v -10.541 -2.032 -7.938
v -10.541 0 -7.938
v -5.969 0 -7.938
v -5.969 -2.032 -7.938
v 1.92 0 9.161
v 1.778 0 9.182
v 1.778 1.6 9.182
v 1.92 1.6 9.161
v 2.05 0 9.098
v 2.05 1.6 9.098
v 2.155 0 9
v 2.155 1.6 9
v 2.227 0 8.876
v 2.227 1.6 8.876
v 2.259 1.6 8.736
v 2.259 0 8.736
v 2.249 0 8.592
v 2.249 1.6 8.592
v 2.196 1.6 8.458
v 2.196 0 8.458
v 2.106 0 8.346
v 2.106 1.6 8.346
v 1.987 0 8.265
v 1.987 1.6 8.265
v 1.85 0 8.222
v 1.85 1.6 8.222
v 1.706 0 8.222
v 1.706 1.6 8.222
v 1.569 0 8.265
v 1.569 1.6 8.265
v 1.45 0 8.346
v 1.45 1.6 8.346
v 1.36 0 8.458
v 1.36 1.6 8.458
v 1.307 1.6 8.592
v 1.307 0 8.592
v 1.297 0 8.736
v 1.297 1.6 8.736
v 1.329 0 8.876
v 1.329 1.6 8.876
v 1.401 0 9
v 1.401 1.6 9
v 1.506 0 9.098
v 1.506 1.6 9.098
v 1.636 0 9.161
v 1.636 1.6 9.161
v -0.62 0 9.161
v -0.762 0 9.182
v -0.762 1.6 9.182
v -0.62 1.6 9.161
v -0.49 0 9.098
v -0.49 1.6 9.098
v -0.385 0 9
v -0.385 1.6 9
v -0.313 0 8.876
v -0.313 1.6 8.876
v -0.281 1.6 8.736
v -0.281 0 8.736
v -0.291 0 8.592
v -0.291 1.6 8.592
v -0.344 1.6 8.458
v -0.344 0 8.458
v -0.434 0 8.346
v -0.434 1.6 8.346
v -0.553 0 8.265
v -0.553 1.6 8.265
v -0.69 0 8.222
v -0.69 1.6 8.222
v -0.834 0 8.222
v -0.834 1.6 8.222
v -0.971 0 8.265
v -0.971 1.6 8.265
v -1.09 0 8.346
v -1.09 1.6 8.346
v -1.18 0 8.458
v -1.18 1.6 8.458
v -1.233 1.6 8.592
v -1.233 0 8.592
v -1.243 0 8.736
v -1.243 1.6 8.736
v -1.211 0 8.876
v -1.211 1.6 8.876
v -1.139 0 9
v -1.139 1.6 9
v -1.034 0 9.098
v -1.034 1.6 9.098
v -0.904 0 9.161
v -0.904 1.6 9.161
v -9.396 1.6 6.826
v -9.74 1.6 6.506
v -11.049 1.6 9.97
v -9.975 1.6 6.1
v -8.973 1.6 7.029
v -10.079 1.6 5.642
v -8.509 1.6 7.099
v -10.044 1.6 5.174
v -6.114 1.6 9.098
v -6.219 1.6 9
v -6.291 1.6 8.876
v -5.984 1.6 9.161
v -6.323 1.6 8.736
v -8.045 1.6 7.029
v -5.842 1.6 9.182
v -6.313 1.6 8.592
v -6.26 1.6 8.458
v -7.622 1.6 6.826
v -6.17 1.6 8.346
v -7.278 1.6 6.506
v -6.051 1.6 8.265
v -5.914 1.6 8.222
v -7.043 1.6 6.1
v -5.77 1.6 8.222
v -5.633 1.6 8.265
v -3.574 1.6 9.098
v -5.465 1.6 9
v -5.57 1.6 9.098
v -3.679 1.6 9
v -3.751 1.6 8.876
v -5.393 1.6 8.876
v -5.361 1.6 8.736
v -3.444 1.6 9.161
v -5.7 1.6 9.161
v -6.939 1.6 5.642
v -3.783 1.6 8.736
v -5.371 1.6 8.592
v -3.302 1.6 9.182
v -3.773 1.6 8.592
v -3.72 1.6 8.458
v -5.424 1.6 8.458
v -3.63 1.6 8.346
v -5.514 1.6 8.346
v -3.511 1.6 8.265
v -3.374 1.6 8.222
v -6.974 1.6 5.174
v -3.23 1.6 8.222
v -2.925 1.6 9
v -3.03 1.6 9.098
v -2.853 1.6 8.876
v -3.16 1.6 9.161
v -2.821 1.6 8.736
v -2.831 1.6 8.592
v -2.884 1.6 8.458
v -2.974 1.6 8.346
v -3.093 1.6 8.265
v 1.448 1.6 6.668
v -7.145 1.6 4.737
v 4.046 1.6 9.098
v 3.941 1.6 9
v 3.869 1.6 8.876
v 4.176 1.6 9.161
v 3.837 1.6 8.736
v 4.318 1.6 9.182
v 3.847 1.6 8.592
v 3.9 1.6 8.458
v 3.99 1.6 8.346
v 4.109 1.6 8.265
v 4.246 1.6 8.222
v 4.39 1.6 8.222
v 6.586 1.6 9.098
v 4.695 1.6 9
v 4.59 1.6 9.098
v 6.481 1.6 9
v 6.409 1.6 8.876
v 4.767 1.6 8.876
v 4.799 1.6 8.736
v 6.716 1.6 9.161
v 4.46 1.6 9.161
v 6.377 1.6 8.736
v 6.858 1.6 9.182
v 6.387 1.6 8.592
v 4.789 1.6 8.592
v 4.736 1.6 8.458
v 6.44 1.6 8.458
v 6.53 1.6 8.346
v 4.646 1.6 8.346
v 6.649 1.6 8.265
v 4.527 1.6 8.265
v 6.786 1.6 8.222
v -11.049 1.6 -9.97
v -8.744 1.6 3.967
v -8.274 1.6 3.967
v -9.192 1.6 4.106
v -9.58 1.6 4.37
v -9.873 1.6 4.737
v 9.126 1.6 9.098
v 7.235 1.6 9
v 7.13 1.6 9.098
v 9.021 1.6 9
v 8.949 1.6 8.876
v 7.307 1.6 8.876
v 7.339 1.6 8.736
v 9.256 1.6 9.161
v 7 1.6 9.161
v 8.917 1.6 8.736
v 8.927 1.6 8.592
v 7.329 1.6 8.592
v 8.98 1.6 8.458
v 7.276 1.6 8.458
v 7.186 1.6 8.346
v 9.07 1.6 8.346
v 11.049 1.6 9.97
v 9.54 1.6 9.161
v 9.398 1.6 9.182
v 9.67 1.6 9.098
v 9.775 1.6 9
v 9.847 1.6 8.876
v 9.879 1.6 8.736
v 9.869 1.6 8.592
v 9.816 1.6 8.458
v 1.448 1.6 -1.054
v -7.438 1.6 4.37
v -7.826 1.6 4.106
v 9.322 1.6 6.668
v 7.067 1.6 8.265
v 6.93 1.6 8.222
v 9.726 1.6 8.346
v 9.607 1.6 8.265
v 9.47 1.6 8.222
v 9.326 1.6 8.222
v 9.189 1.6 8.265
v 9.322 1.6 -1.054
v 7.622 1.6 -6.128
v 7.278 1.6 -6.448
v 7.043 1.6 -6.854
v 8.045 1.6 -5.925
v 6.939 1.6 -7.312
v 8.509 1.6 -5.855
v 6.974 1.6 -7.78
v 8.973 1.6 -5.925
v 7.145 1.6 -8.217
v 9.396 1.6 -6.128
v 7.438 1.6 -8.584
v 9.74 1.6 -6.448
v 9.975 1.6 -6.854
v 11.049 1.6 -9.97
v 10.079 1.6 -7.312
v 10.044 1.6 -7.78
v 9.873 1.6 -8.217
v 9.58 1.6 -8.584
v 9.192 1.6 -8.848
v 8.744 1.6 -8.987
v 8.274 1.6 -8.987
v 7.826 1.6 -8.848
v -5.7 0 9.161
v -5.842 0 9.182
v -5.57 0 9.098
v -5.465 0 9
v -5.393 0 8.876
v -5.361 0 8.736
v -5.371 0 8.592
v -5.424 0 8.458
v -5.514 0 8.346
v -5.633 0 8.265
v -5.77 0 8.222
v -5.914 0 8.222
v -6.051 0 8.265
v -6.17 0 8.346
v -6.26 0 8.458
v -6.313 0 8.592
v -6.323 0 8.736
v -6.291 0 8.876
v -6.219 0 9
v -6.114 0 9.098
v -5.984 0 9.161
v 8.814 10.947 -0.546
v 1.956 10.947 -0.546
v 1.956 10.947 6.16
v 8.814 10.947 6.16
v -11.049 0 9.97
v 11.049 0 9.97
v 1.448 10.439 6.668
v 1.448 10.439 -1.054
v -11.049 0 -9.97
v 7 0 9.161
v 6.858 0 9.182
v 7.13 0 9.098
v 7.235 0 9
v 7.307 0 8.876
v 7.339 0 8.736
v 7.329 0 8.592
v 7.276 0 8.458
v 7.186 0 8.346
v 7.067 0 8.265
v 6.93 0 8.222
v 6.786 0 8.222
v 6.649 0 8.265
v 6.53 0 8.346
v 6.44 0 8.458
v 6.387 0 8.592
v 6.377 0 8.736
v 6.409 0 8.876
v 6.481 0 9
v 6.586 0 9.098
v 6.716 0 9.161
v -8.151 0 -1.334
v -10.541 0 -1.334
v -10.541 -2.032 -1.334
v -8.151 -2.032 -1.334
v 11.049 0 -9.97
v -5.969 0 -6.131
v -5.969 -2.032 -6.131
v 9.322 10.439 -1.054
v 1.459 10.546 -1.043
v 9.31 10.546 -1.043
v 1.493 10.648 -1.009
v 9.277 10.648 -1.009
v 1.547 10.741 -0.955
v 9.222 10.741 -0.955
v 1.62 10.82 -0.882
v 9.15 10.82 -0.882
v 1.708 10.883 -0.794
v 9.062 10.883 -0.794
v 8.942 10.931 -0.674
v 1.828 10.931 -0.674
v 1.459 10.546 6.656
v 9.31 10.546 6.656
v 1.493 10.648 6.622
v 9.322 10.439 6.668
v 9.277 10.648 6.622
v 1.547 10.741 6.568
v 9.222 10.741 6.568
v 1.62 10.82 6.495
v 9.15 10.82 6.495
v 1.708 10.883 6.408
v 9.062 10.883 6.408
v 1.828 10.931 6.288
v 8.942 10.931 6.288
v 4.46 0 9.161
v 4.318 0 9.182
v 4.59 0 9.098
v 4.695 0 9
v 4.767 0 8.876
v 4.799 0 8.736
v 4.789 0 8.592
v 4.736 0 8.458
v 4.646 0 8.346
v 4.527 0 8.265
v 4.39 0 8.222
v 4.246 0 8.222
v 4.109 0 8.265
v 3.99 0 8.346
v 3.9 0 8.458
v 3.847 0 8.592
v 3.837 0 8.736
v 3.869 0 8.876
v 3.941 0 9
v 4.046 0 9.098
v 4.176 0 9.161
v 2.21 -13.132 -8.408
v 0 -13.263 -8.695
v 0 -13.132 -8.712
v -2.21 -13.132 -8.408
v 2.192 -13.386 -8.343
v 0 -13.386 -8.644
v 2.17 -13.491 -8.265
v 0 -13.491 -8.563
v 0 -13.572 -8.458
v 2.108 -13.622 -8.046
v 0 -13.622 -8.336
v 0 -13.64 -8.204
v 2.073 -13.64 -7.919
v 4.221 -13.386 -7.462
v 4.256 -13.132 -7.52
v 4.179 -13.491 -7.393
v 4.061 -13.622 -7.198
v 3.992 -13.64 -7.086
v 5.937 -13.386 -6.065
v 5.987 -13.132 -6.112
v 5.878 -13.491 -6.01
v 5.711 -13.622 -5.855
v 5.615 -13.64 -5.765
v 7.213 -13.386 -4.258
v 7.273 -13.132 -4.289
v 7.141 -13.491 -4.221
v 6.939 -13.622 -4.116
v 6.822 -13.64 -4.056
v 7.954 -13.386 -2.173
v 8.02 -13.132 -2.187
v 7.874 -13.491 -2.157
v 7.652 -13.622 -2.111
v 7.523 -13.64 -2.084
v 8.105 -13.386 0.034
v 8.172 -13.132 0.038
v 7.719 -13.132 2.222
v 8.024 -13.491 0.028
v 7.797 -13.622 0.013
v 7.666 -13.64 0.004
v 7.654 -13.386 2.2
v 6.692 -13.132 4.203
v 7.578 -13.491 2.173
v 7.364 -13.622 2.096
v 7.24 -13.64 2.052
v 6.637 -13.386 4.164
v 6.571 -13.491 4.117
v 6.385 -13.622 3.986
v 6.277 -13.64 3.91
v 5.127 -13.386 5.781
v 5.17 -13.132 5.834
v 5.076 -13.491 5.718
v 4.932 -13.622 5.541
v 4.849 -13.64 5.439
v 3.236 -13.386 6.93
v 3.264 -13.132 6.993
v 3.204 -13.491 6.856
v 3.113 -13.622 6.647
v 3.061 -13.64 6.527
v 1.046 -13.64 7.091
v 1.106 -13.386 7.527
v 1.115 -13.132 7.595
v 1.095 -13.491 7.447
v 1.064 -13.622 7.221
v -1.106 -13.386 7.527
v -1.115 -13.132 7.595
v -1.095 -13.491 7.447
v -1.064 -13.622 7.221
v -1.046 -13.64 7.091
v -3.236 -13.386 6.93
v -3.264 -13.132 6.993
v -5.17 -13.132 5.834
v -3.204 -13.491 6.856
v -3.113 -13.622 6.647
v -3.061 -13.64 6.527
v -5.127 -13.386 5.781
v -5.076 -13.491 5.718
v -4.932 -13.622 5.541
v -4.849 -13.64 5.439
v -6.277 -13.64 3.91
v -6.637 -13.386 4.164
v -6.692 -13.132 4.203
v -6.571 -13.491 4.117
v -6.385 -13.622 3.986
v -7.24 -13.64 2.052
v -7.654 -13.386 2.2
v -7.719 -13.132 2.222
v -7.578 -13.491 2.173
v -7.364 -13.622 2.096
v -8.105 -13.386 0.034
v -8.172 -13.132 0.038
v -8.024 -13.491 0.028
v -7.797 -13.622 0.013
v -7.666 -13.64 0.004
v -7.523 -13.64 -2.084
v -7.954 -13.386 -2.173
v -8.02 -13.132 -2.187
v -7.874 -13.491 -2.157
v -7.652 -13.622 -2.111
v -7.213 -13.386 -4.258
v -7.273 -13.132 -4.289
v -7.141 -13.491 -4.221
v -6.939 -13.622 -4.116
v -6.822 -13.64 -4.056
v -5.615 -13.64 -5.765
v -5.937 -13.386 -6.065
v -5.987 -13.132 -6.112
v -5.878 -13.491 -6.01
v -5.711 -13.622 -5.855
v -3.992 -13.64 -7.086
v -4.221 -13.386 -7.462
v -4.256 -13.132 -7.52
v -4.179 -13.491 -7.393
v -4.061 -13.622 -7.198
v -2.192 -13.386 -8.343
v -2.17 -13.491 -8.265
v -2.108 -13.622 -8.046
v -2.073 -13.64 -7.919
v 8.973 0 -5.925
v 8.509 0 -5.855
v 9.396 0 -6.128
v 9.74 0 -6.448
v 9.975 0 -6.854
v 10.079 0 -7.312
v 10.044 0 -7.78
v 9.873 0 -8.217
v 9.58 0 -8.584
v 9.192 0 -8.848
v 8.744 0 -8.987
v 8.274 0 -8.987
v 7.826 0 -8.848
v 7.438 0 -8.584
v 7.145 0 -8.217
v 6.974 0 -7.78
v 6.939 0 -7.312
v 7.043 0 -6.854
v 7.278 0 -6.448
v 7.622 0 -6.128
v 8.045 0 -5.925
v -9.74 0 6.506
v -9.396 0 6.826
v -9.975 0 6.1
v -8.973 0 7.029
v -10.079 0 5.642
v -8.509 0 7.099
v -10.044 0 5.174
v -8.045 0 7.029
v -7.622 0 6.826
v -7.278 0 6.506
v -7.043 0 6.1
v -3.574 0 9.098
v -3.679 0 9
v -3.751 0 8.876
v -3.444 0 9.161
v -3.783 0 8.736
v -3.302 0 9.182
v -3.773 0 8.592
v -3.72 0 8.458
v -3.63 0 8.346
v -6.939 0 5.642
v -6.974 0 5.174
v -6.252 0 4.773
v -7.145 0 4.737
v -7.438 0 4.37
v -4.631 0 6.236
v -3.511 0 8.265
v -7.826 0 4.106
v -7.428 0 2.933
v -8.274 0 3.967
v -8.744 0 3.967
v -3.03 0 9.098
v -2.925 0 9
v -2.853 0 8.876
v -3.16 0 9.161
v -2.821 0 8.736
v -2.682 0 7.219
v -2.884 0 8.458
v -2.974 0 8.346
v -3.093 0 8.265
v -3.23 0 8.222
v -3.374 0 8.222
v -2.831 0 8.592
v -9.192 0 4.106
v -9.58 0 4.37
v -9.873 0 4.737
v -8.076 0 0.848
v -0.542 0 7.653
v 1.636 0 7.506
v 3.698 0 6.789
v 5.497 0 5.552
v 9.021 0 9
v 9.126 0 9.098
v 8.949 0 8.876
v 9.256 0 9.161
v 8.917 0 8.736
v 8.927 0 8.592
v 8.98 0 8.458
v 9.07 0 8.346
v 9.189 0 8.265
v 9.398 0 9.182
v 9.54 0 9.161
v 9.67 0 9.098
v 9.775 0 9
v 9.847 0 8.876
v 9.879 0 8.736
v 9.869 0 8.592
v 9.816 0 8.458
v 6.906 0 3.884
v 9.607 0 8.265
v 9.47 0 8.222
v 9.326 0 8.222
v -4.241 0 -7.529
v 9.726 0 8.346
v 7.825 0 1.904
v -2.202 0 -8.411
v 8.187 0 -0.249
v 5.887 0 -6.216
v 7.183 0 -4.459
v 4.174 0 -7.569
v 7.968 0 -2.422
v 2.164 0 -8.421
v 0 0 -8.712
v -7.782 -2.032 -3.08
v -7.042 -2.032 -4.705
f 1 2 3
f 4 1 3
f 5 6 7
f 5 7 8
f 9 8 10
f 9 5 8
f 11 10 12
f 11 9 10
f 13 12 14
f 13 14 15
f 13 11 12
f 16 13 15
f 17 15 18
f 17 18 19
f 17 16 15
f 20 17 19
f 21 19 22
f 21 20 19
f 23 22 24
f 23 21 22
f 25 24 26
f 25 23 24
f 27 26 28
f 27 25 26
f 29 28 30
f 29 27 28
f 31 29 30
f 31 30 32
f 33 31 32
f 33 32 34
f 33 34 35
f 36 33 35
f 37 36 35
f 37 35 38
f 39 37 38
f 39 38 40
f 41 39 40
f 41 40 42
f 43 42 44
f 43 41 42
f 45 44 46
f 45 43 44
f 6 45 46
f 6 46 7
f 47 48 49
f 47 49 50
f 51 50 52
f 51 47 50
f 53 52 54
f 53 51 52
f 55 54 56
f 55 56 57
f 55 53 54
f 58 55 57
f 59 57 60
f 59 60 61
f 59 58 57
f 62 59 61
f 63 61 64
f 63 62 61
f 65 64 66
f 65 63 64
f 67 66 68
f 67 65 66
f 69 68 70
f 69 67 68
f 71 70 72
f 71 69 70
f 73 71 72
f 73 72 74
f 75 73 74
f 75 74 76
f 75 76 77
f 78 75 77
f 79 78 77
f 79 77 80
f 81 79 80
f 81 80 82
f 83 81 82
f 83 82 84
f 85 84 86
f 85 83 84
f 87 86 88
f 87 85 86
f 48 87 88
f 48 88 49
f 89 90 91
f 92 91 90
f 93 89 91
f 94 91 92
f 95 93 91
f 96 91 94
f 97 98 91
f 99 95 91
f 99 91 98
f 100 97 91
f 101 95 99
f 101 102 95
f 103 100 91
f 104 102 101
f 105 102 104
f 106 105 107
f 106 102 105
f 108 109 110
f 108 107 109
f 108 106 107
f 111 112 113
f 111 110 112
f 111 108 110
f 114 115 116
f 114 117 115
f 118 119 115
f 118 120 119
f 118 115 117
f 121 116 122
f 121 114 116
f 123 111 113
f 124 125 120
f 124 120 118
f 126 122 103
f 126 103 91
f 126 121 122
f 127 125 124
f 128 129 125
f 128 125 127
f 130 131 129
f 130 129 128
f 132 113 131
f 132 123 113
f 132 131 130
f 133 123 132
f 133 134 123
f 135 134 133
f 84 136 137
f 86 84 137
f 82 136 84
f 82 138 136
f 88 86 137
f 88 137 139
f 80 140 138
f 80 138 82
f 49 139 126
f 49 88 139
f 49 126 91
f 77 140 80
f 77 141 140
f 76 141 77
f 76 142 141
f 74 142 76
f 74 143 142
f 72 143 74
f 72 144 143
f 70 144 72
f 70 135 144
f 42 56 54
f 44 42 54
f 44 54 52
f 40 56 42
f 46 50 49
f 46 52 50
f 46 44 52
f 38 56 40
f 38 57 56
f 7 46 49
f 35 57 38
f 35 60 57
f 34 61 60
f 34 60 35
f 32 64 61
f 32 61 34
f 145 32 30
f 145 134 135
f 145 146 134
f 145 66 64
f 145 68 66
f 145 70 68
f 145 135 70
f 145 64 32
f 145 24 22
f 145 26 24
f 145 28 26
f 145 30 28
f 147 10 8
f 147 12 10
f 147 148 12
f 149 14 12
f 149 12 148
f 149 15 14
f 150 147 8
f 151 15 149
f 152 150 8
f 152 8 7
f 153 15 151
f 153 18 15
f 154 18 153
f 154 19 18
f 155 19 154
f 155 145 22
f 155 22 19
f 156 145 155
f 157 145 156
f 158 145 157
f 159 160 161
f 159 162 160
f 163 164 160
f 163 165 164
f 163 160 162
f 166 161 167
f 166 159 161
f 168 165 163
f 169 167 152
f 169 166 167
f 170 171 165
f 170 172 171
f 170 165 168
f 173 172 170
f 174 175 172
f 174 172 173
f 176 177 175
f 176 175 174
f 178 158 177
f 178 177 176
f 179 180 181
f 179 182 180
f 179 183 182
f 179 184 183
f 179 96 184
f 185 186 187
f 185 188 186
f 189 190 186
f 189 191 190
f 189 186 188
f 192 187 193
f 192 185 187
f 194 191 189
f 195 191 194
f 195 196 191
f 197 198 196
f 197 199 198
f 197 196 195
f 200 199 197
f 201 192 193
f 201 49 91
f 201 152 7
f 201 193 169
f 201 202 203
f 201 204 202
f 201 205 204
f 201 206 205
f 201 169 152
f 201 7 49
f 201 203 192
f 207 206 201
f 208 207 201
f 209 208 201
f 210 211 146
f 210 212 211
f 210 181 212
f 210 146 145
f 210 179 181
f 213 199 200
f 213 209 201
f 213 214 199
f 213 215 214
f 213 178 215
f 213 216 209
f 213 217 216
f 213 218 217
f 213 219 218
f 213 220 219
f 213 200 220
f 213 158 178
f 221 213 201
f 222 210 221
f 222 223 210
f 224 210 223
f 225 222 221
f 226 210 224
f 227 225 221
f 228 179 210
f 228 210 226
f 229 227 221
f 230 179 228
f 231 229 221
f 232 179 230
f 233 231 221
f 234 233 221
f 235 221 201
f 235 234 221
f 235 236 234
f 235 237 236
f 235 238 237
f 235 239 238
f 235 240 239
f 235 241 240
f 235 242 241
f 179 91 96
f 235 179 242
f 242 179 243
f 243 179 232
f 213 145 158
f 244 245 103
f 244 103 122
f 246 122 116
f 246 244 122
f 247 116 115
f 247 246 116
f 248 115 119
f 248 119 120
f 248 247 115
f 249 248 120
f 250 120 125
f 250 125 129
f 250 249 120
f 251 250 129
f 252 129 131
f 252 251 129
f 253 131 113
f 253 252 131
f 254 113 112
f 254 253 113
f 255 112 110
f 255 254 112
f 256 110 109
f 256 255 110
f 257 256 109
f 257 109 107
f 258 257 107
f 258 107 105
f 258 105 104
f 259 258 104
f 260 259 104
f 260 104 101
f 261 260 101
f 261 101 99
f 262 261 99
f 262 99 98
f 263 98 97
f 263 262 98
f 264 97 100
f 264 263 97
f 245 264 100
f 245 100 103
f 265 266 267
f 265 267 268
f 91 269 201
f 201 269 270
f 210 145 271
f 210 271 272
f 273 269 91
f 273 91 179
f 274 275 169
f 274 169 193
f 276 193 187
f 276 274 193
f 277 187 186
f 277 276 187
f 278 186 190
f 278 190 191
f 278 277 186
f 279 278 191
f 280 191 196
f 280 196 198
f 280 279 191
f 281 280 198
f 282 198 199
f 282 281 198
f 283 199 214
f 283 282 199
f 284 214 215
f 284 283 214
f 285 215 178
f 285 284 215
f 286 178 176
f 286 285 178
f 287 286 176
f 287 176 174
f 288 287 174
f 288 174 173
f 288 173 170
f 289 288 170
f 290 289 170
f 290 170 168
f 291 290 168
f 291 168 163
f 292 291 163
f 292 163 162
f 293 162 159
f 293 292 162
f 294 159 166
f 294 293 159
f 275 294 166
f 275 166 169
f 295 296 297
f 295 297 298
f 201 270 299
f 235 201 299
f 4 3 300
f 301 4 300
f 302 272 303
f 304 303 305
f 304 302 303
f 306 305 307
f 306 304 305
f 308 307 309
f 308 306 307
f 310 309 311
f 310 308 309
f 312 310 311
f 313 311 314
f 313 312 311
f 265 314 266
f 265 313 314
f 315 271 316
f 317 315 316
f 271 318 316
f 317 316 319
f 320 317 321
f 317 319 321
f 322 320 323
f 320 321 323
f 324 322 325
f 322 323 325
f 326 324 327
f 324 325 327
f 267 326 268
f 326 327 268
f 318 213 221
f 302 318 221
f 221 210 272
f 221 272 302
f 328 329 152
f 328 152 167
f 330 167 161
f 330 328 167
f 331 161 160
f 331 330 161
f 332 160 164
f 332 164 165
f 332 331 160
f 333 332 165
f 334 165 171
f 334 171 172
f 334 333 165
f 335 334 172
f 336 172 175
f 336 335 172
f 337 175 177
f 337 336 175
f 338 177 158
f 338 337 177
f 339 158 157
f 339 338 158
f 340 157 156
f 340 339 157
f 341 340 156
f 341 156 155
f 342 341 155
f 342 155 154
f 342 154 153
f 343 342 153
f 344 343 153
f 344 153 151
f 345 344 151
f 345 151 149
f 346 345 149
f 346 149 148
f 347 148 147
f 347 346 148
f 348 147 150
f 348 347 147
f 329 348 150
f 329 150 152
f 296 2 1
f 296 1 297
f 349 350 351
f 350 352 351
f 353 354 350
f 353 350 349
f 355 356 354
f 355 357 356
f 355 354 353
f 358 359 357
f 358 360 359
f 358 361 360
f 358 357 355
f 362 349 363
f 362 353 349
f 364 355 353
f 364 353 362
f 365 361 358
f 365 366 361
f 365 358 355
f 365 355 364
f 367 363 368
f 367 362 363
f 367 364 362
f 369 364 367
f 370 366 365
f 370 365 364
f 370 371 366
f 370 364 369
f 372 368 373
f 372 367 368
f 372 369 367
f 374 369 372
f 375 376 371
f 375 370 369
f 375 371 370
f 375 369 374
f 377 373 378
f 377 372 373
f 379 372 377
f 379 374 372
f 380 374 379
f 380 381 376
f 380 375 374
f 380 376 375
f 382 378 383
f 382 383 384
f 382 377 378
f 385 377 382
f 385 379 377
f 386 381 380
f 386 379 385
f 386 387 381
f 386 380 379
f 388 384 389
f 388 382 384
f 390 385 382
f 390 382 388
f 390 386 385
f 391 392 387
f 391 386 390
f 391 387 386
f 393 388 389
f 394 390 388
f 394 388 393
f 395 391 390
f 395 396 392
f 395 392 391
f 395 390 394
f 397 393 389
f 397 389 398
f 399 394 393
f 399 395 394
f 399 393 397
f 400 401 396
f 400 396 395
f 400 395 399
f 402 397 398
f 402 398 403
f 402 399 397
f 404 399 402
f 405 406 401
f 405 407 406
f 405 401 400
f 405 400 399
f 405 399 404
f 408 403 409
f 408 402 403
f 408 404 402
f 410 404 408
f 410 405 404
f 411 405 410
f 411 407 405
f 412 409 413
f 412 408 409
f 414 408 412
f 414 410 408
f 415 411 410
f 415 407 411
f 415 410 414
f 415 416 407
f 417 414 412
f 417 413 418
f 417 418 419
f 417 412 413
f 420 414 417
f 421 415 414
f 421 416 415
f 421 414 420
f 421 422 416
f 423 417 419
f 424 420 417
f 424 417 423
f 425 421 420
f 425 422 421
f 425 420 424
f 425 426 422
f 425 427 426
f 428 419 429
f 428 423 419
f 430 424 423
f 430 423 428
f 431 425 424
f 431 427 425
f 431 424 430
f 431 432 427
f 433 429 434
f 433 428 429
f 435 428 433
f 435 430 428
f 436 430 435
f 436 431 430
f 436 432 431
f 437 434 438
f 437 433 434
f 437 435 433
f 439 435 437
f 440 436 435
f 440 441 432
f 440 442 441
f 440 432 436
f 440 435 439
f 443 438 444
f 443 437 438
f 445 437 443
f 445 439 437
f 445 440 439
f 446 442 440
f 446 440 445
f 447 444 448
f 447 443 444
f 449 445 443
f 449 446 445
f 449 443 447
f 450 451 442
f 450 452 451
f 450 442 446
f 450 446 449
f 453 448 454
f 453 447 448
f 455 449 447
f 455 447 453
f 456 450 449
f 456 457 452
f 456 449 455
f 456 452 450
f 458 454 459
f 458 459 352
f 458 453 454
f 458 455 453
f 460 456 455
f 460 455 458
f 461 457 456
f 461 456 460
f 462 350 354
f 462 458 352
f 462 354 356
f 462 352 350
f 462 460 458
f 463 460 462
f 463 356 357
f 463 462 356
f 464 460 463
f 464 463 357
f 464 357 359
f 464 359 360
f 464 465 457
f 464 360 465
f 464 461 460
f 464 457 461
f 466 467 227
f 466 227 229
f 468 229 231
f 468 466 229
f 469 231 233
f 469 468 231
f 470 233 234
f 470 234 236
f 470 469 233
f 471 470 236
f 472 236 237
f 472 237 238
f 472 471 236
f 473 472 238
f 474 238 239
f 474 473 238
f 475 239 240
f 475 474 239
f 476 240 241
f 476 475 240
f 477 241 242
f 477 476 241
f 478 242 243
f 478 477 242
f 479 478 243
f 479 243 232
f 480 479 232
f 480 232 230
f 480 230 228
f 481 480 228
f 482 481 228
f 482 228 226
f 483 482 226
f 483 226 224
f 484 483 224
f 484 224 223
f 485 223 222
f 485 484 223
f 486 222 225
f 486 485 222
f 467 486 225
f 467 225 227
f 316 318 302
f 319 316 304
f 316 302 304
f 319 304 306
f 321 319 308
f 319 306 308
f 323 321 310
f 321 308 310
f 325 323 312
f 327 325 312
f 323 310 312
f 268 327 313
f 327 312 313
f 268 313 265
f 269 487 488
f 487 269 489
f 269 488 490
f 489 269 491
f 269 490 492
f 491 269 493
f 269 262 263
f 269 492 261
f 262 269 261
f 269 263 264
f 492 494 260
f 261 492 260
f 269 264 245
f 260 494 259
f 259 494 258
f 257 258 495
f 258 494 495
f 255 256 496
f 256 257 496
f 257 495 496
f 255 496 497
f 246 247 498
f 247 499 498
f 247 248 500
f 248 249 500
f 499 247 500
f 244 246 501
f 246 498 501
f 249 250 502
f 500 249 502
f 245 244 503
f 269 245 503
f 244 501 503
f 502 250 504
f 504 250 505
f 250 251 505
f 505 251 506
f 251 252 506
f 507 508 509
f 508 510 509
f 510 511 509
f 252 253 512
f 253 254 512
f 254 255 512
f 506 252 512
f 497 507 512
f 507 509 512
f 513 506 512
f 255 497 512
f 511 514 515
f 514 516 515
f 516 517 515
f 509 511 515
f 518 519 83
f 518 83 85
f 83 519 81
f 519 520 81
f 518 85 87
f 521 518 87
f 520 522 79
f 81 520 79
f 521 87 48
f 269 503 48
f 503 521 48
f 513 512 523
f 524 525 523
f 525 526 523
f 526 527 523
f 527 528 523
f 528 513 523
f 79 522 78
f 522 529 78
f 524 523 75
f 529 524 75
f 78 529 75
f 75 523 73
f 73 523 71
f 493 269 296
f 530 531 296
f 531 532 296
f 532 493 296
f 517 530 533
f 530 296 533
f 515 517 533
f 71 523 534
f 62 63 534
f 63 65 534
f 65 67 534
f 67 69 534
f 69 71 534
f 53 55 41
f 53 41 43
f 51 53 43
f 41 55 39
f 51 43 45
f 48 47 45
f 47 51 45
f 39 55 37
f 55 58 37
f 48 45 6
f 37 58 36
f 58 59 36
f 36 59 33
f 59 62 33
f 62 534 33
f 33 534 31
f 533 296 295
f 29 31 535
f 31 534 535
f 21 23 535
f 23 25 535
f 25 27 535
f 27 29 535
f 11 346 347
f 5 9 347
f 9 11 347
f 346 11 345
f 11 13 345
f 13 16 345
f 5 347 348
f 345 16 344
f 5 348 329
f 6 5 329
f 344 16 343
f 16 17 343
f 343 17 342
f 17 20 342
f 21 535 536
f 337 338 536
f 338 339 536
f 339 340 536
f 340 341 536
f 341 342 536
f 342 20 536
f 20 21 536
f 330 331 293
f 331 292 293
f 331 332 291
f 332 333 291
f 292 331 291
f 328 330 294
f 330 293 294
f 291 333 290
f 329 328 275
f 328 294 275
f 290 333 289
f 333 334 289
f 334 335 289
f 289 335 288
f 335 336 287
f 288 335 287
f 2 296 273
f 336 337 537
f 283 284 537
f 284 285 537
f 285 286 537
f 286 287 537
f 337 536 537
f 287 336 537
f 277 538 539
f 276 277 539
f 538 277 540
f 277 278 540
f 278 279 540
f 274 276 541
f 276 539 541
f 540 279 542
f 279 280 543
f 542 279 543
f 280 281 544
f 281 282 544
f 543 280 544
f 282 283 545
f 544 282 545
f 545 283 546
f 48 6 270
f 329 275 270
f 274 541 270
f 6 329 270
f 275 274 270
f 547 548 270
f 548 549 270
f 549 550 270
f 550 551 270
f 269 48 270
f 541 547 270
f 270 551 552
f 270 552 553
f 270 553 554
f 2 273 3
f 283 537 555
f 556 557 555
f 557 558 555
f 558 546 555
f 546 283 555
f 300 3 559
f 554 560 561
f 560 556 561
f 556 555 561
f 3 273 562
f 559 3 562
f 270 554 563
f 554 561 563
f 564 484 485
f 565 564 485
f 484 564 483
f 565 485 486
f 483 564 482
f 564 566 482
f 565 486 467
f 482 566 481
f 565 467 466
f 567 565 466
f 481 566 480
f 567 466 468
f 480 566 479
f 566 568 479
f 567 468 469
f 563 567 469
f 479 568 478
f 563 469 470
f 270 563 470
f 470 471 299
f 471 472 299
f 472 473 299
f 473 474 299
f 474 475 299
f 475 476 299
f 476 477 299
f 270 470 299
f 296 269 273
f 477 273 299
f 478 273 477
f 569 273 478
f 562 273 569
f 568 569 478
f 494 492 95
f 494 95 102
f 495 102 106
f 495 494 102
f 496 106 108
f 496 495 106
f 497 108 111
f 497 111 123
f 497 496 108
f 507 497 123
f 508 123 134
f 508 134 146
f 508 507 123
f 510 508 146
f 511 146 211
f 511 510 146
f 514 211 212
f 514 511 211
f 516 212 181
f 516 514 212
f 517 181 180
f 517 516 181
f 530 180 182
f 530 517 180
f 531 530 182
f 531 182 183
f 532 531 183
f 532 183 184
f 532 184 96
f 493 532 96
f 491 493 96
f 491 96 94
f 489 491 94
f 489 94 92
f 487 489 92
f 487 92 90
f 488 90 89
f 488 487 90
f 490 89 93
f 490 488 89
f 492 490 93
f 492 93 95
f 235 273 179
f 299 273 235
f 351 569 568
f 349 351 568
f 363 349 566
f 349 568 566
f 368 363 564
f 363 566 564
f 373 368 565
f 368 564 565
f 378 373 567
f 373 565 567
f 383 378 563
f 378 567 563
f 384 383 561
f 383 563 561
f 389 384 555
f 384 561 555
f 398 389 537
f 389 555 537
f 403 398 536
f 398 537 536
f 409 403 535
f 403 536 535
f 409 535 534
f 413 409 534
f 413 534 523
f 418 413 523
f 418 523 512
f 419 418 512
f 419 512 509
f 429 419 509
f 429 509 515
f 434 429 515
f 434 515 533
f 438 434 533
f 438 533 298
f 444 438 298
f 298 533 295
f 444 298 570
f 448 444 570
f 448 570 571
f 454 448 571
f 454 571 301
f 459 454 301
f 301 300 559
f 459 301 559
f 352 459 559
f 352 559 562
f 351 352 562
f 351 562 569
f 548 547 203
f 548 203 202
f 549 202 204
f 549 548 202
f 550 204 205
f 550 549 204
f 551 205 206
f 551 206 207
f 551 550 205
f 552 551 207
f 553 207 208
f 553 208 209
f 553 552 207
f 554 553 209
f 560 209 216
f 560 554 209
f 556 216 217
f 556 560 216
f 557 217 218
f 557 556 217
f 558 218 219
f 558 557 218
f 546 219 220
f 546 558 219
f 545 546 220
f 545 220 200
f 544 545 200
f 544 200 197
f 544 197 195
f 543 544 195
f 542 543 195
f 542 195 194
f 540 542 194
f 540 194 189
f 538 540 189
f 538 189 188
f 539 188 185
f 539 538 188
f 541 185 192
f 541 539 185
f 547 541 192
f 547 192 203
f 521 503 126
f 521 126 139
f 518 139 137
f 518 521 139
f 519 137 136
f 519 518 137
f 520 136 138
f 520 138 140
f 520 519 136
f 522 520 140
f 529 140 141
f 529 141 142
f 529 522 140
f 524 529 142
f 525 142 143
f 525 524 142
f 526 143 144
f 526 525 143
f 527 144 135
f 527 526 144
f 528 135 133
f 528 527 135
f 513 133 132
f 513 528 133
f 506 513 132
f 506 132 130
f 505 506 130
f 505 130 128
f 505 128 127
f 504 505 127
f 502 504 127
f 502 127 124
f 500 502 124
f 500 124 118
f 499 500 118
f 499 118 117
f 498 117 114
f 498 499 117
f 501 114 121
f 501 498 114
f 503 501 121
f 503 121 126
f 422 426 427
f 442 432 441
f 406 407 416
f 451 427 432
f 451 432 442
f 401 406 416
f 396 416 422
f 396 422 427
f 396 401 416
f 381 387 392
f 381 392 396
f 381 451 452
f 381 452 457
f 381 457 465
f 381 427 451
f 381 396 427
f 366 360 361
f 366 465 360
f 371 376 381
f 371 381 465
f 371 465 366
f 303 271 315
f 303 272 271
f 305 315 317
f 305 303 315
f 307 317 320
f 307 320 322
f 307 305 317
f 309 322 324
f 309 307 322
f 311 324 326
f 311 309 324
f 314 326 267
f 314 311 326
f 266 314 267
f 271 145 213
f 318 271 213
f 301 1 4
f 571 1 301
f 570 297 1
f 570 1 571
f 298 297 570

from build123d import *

# Parameters (mm, degrees)
SKETCH1_W           = 22.098
SKETCH1_H           = 19.939
SKETCH1_R           = 1.5748
SKETCH1_R_2         = 0.4826
BOSS_EXTRUDE1_DEPTH = 1.6002
SKETCH2_W           = 7.874
SKETCH2_H           = 7.7216
BOSS_EXTRUDE2_DEPTH = 9.3472
SKETCH7_R           = 8.1915
BOSS_EXTRUDE6_DEPTH = 13.6398
SKETCH8_W           = 4.572
SKETCH8_H           = 6.604
BOSS_EXTRUDE7_DEPTH = 2.032
FILLET2_R           = 0.508
FILLET3_R           = 0.508


with BuildPart() as part:
    # Sketch1 → Boss-Extrude1 (new body)
    with BuildSketch(Plane(origin=(0, 0, 0), x_dir=(1, 0, 0), z_dir=(0, 1, 0))):
        Rectangle(SKETCH1_W, SKETCH1_H)
        with Locations(Location((8.509, 7.4295, 0), (0, 0, 270))):
            Circle(SKETCH1_R, mode=Mode.SUBTRACT)
        with Locations(Location((-8.509, -5.5245, 0), (0, 0, 270))):
            Circle(SKETCH1_R, mode=Mode.SUBTRACT)
        with Locations(Location((9.398, -8.6995, 0), (0, 0, 270))):
            Circle(SKETCH1_R_2, mode=Mode.SUBTRACT)
        with Locations(Location((6.858, -8.6995, 0), (0, 0, 270))):
            Circle(SKETCH1_R_2, mode=Mode.SUBTRACT)
        with Locations(Location((4.318, -8.6995, 0), (0, 0, 270))):
            Circle(SKETCH1_R_2, mode=Mode.SUBTRACT)
        with Locations(Location((1.778, -8.6995, 0), (0, 0, 270))):
            Circle(SKETCH1_R_2, mode=Mode.SUBTRACT)
        with Locations(Location((-0.762, -8.6995, 0), (0, 0, 270))):
            Circle(SKETCH1_R_2, mode=Mode.SUBTRACT)
        with Locations(Location((-3.302, -8.6995, 0), (0, 0, 270))):
            Circle(SKETCH1_R_2, mode=Mode.SUBTRACT)
        with Locations(Location((-5.842, -8.6995, 0), (0, 0, 270))):
            Circle(SKETCH1_R_2, mode=Mode.SUBTRACT)
    extrude(amount=BOSS_EXTRUDE1_DEPTH)

    # Sketch2 → Boss-Extrude2 (add)
    with BuildSketch(Plane(origin=(0, 1.6002, 0), x_dir=(1, 0, 0), z_dir=(0, 1, 0))):
        with Locations((5.3848, -2.8067)):
            Rectangle(SKETCH2_W, SKETCH2_H)
    extrude(amount=BOSS_EXTRUDE2_DEPTH)

    # Sketch7 → Boss-Extrude6 (add)
    with BuildSketch(Plane.XZ):
        with Locations(Location((0, -0.5207, 0), (0, 0, 270))):
            Circle(SKETCH7_R)
    extrude(amount=BOSS_EXTRUDE6_DEPTH)

    # Sketch8 → Boss-Extrude7 (add)
    with BuildSketch(Plane.XZ):
        with Locations((-8.255, -4.6355)):
            Rectangle(SKETCH8_W, SKETCH8_H)
    extrude(amount=BOSS_EXTRUDE7_DEPTH)

    # Fillet2
    fillet2_edges = [part.edges().sort_by_distance(p)[0] for p in [
        (0, -13.6398, 7.6708),
    ]]
    fillet(fillet2_edges, radius=FILLET2_R)

    # Fillet3
    fillet3_edges = [part.edges().sort_by_distance(p)[0] for p in [
        (1.4478, 10.9474, 2.8067),
        (5.3848, 10.9474, 6.6675),
        (9.3218, 10.9474, 2.8067),
        (5.3848, 10.9474, -1.0541),
    ]]
    fillet(fillet3_edges, radius=FILLET3_R)


solid = part.part
